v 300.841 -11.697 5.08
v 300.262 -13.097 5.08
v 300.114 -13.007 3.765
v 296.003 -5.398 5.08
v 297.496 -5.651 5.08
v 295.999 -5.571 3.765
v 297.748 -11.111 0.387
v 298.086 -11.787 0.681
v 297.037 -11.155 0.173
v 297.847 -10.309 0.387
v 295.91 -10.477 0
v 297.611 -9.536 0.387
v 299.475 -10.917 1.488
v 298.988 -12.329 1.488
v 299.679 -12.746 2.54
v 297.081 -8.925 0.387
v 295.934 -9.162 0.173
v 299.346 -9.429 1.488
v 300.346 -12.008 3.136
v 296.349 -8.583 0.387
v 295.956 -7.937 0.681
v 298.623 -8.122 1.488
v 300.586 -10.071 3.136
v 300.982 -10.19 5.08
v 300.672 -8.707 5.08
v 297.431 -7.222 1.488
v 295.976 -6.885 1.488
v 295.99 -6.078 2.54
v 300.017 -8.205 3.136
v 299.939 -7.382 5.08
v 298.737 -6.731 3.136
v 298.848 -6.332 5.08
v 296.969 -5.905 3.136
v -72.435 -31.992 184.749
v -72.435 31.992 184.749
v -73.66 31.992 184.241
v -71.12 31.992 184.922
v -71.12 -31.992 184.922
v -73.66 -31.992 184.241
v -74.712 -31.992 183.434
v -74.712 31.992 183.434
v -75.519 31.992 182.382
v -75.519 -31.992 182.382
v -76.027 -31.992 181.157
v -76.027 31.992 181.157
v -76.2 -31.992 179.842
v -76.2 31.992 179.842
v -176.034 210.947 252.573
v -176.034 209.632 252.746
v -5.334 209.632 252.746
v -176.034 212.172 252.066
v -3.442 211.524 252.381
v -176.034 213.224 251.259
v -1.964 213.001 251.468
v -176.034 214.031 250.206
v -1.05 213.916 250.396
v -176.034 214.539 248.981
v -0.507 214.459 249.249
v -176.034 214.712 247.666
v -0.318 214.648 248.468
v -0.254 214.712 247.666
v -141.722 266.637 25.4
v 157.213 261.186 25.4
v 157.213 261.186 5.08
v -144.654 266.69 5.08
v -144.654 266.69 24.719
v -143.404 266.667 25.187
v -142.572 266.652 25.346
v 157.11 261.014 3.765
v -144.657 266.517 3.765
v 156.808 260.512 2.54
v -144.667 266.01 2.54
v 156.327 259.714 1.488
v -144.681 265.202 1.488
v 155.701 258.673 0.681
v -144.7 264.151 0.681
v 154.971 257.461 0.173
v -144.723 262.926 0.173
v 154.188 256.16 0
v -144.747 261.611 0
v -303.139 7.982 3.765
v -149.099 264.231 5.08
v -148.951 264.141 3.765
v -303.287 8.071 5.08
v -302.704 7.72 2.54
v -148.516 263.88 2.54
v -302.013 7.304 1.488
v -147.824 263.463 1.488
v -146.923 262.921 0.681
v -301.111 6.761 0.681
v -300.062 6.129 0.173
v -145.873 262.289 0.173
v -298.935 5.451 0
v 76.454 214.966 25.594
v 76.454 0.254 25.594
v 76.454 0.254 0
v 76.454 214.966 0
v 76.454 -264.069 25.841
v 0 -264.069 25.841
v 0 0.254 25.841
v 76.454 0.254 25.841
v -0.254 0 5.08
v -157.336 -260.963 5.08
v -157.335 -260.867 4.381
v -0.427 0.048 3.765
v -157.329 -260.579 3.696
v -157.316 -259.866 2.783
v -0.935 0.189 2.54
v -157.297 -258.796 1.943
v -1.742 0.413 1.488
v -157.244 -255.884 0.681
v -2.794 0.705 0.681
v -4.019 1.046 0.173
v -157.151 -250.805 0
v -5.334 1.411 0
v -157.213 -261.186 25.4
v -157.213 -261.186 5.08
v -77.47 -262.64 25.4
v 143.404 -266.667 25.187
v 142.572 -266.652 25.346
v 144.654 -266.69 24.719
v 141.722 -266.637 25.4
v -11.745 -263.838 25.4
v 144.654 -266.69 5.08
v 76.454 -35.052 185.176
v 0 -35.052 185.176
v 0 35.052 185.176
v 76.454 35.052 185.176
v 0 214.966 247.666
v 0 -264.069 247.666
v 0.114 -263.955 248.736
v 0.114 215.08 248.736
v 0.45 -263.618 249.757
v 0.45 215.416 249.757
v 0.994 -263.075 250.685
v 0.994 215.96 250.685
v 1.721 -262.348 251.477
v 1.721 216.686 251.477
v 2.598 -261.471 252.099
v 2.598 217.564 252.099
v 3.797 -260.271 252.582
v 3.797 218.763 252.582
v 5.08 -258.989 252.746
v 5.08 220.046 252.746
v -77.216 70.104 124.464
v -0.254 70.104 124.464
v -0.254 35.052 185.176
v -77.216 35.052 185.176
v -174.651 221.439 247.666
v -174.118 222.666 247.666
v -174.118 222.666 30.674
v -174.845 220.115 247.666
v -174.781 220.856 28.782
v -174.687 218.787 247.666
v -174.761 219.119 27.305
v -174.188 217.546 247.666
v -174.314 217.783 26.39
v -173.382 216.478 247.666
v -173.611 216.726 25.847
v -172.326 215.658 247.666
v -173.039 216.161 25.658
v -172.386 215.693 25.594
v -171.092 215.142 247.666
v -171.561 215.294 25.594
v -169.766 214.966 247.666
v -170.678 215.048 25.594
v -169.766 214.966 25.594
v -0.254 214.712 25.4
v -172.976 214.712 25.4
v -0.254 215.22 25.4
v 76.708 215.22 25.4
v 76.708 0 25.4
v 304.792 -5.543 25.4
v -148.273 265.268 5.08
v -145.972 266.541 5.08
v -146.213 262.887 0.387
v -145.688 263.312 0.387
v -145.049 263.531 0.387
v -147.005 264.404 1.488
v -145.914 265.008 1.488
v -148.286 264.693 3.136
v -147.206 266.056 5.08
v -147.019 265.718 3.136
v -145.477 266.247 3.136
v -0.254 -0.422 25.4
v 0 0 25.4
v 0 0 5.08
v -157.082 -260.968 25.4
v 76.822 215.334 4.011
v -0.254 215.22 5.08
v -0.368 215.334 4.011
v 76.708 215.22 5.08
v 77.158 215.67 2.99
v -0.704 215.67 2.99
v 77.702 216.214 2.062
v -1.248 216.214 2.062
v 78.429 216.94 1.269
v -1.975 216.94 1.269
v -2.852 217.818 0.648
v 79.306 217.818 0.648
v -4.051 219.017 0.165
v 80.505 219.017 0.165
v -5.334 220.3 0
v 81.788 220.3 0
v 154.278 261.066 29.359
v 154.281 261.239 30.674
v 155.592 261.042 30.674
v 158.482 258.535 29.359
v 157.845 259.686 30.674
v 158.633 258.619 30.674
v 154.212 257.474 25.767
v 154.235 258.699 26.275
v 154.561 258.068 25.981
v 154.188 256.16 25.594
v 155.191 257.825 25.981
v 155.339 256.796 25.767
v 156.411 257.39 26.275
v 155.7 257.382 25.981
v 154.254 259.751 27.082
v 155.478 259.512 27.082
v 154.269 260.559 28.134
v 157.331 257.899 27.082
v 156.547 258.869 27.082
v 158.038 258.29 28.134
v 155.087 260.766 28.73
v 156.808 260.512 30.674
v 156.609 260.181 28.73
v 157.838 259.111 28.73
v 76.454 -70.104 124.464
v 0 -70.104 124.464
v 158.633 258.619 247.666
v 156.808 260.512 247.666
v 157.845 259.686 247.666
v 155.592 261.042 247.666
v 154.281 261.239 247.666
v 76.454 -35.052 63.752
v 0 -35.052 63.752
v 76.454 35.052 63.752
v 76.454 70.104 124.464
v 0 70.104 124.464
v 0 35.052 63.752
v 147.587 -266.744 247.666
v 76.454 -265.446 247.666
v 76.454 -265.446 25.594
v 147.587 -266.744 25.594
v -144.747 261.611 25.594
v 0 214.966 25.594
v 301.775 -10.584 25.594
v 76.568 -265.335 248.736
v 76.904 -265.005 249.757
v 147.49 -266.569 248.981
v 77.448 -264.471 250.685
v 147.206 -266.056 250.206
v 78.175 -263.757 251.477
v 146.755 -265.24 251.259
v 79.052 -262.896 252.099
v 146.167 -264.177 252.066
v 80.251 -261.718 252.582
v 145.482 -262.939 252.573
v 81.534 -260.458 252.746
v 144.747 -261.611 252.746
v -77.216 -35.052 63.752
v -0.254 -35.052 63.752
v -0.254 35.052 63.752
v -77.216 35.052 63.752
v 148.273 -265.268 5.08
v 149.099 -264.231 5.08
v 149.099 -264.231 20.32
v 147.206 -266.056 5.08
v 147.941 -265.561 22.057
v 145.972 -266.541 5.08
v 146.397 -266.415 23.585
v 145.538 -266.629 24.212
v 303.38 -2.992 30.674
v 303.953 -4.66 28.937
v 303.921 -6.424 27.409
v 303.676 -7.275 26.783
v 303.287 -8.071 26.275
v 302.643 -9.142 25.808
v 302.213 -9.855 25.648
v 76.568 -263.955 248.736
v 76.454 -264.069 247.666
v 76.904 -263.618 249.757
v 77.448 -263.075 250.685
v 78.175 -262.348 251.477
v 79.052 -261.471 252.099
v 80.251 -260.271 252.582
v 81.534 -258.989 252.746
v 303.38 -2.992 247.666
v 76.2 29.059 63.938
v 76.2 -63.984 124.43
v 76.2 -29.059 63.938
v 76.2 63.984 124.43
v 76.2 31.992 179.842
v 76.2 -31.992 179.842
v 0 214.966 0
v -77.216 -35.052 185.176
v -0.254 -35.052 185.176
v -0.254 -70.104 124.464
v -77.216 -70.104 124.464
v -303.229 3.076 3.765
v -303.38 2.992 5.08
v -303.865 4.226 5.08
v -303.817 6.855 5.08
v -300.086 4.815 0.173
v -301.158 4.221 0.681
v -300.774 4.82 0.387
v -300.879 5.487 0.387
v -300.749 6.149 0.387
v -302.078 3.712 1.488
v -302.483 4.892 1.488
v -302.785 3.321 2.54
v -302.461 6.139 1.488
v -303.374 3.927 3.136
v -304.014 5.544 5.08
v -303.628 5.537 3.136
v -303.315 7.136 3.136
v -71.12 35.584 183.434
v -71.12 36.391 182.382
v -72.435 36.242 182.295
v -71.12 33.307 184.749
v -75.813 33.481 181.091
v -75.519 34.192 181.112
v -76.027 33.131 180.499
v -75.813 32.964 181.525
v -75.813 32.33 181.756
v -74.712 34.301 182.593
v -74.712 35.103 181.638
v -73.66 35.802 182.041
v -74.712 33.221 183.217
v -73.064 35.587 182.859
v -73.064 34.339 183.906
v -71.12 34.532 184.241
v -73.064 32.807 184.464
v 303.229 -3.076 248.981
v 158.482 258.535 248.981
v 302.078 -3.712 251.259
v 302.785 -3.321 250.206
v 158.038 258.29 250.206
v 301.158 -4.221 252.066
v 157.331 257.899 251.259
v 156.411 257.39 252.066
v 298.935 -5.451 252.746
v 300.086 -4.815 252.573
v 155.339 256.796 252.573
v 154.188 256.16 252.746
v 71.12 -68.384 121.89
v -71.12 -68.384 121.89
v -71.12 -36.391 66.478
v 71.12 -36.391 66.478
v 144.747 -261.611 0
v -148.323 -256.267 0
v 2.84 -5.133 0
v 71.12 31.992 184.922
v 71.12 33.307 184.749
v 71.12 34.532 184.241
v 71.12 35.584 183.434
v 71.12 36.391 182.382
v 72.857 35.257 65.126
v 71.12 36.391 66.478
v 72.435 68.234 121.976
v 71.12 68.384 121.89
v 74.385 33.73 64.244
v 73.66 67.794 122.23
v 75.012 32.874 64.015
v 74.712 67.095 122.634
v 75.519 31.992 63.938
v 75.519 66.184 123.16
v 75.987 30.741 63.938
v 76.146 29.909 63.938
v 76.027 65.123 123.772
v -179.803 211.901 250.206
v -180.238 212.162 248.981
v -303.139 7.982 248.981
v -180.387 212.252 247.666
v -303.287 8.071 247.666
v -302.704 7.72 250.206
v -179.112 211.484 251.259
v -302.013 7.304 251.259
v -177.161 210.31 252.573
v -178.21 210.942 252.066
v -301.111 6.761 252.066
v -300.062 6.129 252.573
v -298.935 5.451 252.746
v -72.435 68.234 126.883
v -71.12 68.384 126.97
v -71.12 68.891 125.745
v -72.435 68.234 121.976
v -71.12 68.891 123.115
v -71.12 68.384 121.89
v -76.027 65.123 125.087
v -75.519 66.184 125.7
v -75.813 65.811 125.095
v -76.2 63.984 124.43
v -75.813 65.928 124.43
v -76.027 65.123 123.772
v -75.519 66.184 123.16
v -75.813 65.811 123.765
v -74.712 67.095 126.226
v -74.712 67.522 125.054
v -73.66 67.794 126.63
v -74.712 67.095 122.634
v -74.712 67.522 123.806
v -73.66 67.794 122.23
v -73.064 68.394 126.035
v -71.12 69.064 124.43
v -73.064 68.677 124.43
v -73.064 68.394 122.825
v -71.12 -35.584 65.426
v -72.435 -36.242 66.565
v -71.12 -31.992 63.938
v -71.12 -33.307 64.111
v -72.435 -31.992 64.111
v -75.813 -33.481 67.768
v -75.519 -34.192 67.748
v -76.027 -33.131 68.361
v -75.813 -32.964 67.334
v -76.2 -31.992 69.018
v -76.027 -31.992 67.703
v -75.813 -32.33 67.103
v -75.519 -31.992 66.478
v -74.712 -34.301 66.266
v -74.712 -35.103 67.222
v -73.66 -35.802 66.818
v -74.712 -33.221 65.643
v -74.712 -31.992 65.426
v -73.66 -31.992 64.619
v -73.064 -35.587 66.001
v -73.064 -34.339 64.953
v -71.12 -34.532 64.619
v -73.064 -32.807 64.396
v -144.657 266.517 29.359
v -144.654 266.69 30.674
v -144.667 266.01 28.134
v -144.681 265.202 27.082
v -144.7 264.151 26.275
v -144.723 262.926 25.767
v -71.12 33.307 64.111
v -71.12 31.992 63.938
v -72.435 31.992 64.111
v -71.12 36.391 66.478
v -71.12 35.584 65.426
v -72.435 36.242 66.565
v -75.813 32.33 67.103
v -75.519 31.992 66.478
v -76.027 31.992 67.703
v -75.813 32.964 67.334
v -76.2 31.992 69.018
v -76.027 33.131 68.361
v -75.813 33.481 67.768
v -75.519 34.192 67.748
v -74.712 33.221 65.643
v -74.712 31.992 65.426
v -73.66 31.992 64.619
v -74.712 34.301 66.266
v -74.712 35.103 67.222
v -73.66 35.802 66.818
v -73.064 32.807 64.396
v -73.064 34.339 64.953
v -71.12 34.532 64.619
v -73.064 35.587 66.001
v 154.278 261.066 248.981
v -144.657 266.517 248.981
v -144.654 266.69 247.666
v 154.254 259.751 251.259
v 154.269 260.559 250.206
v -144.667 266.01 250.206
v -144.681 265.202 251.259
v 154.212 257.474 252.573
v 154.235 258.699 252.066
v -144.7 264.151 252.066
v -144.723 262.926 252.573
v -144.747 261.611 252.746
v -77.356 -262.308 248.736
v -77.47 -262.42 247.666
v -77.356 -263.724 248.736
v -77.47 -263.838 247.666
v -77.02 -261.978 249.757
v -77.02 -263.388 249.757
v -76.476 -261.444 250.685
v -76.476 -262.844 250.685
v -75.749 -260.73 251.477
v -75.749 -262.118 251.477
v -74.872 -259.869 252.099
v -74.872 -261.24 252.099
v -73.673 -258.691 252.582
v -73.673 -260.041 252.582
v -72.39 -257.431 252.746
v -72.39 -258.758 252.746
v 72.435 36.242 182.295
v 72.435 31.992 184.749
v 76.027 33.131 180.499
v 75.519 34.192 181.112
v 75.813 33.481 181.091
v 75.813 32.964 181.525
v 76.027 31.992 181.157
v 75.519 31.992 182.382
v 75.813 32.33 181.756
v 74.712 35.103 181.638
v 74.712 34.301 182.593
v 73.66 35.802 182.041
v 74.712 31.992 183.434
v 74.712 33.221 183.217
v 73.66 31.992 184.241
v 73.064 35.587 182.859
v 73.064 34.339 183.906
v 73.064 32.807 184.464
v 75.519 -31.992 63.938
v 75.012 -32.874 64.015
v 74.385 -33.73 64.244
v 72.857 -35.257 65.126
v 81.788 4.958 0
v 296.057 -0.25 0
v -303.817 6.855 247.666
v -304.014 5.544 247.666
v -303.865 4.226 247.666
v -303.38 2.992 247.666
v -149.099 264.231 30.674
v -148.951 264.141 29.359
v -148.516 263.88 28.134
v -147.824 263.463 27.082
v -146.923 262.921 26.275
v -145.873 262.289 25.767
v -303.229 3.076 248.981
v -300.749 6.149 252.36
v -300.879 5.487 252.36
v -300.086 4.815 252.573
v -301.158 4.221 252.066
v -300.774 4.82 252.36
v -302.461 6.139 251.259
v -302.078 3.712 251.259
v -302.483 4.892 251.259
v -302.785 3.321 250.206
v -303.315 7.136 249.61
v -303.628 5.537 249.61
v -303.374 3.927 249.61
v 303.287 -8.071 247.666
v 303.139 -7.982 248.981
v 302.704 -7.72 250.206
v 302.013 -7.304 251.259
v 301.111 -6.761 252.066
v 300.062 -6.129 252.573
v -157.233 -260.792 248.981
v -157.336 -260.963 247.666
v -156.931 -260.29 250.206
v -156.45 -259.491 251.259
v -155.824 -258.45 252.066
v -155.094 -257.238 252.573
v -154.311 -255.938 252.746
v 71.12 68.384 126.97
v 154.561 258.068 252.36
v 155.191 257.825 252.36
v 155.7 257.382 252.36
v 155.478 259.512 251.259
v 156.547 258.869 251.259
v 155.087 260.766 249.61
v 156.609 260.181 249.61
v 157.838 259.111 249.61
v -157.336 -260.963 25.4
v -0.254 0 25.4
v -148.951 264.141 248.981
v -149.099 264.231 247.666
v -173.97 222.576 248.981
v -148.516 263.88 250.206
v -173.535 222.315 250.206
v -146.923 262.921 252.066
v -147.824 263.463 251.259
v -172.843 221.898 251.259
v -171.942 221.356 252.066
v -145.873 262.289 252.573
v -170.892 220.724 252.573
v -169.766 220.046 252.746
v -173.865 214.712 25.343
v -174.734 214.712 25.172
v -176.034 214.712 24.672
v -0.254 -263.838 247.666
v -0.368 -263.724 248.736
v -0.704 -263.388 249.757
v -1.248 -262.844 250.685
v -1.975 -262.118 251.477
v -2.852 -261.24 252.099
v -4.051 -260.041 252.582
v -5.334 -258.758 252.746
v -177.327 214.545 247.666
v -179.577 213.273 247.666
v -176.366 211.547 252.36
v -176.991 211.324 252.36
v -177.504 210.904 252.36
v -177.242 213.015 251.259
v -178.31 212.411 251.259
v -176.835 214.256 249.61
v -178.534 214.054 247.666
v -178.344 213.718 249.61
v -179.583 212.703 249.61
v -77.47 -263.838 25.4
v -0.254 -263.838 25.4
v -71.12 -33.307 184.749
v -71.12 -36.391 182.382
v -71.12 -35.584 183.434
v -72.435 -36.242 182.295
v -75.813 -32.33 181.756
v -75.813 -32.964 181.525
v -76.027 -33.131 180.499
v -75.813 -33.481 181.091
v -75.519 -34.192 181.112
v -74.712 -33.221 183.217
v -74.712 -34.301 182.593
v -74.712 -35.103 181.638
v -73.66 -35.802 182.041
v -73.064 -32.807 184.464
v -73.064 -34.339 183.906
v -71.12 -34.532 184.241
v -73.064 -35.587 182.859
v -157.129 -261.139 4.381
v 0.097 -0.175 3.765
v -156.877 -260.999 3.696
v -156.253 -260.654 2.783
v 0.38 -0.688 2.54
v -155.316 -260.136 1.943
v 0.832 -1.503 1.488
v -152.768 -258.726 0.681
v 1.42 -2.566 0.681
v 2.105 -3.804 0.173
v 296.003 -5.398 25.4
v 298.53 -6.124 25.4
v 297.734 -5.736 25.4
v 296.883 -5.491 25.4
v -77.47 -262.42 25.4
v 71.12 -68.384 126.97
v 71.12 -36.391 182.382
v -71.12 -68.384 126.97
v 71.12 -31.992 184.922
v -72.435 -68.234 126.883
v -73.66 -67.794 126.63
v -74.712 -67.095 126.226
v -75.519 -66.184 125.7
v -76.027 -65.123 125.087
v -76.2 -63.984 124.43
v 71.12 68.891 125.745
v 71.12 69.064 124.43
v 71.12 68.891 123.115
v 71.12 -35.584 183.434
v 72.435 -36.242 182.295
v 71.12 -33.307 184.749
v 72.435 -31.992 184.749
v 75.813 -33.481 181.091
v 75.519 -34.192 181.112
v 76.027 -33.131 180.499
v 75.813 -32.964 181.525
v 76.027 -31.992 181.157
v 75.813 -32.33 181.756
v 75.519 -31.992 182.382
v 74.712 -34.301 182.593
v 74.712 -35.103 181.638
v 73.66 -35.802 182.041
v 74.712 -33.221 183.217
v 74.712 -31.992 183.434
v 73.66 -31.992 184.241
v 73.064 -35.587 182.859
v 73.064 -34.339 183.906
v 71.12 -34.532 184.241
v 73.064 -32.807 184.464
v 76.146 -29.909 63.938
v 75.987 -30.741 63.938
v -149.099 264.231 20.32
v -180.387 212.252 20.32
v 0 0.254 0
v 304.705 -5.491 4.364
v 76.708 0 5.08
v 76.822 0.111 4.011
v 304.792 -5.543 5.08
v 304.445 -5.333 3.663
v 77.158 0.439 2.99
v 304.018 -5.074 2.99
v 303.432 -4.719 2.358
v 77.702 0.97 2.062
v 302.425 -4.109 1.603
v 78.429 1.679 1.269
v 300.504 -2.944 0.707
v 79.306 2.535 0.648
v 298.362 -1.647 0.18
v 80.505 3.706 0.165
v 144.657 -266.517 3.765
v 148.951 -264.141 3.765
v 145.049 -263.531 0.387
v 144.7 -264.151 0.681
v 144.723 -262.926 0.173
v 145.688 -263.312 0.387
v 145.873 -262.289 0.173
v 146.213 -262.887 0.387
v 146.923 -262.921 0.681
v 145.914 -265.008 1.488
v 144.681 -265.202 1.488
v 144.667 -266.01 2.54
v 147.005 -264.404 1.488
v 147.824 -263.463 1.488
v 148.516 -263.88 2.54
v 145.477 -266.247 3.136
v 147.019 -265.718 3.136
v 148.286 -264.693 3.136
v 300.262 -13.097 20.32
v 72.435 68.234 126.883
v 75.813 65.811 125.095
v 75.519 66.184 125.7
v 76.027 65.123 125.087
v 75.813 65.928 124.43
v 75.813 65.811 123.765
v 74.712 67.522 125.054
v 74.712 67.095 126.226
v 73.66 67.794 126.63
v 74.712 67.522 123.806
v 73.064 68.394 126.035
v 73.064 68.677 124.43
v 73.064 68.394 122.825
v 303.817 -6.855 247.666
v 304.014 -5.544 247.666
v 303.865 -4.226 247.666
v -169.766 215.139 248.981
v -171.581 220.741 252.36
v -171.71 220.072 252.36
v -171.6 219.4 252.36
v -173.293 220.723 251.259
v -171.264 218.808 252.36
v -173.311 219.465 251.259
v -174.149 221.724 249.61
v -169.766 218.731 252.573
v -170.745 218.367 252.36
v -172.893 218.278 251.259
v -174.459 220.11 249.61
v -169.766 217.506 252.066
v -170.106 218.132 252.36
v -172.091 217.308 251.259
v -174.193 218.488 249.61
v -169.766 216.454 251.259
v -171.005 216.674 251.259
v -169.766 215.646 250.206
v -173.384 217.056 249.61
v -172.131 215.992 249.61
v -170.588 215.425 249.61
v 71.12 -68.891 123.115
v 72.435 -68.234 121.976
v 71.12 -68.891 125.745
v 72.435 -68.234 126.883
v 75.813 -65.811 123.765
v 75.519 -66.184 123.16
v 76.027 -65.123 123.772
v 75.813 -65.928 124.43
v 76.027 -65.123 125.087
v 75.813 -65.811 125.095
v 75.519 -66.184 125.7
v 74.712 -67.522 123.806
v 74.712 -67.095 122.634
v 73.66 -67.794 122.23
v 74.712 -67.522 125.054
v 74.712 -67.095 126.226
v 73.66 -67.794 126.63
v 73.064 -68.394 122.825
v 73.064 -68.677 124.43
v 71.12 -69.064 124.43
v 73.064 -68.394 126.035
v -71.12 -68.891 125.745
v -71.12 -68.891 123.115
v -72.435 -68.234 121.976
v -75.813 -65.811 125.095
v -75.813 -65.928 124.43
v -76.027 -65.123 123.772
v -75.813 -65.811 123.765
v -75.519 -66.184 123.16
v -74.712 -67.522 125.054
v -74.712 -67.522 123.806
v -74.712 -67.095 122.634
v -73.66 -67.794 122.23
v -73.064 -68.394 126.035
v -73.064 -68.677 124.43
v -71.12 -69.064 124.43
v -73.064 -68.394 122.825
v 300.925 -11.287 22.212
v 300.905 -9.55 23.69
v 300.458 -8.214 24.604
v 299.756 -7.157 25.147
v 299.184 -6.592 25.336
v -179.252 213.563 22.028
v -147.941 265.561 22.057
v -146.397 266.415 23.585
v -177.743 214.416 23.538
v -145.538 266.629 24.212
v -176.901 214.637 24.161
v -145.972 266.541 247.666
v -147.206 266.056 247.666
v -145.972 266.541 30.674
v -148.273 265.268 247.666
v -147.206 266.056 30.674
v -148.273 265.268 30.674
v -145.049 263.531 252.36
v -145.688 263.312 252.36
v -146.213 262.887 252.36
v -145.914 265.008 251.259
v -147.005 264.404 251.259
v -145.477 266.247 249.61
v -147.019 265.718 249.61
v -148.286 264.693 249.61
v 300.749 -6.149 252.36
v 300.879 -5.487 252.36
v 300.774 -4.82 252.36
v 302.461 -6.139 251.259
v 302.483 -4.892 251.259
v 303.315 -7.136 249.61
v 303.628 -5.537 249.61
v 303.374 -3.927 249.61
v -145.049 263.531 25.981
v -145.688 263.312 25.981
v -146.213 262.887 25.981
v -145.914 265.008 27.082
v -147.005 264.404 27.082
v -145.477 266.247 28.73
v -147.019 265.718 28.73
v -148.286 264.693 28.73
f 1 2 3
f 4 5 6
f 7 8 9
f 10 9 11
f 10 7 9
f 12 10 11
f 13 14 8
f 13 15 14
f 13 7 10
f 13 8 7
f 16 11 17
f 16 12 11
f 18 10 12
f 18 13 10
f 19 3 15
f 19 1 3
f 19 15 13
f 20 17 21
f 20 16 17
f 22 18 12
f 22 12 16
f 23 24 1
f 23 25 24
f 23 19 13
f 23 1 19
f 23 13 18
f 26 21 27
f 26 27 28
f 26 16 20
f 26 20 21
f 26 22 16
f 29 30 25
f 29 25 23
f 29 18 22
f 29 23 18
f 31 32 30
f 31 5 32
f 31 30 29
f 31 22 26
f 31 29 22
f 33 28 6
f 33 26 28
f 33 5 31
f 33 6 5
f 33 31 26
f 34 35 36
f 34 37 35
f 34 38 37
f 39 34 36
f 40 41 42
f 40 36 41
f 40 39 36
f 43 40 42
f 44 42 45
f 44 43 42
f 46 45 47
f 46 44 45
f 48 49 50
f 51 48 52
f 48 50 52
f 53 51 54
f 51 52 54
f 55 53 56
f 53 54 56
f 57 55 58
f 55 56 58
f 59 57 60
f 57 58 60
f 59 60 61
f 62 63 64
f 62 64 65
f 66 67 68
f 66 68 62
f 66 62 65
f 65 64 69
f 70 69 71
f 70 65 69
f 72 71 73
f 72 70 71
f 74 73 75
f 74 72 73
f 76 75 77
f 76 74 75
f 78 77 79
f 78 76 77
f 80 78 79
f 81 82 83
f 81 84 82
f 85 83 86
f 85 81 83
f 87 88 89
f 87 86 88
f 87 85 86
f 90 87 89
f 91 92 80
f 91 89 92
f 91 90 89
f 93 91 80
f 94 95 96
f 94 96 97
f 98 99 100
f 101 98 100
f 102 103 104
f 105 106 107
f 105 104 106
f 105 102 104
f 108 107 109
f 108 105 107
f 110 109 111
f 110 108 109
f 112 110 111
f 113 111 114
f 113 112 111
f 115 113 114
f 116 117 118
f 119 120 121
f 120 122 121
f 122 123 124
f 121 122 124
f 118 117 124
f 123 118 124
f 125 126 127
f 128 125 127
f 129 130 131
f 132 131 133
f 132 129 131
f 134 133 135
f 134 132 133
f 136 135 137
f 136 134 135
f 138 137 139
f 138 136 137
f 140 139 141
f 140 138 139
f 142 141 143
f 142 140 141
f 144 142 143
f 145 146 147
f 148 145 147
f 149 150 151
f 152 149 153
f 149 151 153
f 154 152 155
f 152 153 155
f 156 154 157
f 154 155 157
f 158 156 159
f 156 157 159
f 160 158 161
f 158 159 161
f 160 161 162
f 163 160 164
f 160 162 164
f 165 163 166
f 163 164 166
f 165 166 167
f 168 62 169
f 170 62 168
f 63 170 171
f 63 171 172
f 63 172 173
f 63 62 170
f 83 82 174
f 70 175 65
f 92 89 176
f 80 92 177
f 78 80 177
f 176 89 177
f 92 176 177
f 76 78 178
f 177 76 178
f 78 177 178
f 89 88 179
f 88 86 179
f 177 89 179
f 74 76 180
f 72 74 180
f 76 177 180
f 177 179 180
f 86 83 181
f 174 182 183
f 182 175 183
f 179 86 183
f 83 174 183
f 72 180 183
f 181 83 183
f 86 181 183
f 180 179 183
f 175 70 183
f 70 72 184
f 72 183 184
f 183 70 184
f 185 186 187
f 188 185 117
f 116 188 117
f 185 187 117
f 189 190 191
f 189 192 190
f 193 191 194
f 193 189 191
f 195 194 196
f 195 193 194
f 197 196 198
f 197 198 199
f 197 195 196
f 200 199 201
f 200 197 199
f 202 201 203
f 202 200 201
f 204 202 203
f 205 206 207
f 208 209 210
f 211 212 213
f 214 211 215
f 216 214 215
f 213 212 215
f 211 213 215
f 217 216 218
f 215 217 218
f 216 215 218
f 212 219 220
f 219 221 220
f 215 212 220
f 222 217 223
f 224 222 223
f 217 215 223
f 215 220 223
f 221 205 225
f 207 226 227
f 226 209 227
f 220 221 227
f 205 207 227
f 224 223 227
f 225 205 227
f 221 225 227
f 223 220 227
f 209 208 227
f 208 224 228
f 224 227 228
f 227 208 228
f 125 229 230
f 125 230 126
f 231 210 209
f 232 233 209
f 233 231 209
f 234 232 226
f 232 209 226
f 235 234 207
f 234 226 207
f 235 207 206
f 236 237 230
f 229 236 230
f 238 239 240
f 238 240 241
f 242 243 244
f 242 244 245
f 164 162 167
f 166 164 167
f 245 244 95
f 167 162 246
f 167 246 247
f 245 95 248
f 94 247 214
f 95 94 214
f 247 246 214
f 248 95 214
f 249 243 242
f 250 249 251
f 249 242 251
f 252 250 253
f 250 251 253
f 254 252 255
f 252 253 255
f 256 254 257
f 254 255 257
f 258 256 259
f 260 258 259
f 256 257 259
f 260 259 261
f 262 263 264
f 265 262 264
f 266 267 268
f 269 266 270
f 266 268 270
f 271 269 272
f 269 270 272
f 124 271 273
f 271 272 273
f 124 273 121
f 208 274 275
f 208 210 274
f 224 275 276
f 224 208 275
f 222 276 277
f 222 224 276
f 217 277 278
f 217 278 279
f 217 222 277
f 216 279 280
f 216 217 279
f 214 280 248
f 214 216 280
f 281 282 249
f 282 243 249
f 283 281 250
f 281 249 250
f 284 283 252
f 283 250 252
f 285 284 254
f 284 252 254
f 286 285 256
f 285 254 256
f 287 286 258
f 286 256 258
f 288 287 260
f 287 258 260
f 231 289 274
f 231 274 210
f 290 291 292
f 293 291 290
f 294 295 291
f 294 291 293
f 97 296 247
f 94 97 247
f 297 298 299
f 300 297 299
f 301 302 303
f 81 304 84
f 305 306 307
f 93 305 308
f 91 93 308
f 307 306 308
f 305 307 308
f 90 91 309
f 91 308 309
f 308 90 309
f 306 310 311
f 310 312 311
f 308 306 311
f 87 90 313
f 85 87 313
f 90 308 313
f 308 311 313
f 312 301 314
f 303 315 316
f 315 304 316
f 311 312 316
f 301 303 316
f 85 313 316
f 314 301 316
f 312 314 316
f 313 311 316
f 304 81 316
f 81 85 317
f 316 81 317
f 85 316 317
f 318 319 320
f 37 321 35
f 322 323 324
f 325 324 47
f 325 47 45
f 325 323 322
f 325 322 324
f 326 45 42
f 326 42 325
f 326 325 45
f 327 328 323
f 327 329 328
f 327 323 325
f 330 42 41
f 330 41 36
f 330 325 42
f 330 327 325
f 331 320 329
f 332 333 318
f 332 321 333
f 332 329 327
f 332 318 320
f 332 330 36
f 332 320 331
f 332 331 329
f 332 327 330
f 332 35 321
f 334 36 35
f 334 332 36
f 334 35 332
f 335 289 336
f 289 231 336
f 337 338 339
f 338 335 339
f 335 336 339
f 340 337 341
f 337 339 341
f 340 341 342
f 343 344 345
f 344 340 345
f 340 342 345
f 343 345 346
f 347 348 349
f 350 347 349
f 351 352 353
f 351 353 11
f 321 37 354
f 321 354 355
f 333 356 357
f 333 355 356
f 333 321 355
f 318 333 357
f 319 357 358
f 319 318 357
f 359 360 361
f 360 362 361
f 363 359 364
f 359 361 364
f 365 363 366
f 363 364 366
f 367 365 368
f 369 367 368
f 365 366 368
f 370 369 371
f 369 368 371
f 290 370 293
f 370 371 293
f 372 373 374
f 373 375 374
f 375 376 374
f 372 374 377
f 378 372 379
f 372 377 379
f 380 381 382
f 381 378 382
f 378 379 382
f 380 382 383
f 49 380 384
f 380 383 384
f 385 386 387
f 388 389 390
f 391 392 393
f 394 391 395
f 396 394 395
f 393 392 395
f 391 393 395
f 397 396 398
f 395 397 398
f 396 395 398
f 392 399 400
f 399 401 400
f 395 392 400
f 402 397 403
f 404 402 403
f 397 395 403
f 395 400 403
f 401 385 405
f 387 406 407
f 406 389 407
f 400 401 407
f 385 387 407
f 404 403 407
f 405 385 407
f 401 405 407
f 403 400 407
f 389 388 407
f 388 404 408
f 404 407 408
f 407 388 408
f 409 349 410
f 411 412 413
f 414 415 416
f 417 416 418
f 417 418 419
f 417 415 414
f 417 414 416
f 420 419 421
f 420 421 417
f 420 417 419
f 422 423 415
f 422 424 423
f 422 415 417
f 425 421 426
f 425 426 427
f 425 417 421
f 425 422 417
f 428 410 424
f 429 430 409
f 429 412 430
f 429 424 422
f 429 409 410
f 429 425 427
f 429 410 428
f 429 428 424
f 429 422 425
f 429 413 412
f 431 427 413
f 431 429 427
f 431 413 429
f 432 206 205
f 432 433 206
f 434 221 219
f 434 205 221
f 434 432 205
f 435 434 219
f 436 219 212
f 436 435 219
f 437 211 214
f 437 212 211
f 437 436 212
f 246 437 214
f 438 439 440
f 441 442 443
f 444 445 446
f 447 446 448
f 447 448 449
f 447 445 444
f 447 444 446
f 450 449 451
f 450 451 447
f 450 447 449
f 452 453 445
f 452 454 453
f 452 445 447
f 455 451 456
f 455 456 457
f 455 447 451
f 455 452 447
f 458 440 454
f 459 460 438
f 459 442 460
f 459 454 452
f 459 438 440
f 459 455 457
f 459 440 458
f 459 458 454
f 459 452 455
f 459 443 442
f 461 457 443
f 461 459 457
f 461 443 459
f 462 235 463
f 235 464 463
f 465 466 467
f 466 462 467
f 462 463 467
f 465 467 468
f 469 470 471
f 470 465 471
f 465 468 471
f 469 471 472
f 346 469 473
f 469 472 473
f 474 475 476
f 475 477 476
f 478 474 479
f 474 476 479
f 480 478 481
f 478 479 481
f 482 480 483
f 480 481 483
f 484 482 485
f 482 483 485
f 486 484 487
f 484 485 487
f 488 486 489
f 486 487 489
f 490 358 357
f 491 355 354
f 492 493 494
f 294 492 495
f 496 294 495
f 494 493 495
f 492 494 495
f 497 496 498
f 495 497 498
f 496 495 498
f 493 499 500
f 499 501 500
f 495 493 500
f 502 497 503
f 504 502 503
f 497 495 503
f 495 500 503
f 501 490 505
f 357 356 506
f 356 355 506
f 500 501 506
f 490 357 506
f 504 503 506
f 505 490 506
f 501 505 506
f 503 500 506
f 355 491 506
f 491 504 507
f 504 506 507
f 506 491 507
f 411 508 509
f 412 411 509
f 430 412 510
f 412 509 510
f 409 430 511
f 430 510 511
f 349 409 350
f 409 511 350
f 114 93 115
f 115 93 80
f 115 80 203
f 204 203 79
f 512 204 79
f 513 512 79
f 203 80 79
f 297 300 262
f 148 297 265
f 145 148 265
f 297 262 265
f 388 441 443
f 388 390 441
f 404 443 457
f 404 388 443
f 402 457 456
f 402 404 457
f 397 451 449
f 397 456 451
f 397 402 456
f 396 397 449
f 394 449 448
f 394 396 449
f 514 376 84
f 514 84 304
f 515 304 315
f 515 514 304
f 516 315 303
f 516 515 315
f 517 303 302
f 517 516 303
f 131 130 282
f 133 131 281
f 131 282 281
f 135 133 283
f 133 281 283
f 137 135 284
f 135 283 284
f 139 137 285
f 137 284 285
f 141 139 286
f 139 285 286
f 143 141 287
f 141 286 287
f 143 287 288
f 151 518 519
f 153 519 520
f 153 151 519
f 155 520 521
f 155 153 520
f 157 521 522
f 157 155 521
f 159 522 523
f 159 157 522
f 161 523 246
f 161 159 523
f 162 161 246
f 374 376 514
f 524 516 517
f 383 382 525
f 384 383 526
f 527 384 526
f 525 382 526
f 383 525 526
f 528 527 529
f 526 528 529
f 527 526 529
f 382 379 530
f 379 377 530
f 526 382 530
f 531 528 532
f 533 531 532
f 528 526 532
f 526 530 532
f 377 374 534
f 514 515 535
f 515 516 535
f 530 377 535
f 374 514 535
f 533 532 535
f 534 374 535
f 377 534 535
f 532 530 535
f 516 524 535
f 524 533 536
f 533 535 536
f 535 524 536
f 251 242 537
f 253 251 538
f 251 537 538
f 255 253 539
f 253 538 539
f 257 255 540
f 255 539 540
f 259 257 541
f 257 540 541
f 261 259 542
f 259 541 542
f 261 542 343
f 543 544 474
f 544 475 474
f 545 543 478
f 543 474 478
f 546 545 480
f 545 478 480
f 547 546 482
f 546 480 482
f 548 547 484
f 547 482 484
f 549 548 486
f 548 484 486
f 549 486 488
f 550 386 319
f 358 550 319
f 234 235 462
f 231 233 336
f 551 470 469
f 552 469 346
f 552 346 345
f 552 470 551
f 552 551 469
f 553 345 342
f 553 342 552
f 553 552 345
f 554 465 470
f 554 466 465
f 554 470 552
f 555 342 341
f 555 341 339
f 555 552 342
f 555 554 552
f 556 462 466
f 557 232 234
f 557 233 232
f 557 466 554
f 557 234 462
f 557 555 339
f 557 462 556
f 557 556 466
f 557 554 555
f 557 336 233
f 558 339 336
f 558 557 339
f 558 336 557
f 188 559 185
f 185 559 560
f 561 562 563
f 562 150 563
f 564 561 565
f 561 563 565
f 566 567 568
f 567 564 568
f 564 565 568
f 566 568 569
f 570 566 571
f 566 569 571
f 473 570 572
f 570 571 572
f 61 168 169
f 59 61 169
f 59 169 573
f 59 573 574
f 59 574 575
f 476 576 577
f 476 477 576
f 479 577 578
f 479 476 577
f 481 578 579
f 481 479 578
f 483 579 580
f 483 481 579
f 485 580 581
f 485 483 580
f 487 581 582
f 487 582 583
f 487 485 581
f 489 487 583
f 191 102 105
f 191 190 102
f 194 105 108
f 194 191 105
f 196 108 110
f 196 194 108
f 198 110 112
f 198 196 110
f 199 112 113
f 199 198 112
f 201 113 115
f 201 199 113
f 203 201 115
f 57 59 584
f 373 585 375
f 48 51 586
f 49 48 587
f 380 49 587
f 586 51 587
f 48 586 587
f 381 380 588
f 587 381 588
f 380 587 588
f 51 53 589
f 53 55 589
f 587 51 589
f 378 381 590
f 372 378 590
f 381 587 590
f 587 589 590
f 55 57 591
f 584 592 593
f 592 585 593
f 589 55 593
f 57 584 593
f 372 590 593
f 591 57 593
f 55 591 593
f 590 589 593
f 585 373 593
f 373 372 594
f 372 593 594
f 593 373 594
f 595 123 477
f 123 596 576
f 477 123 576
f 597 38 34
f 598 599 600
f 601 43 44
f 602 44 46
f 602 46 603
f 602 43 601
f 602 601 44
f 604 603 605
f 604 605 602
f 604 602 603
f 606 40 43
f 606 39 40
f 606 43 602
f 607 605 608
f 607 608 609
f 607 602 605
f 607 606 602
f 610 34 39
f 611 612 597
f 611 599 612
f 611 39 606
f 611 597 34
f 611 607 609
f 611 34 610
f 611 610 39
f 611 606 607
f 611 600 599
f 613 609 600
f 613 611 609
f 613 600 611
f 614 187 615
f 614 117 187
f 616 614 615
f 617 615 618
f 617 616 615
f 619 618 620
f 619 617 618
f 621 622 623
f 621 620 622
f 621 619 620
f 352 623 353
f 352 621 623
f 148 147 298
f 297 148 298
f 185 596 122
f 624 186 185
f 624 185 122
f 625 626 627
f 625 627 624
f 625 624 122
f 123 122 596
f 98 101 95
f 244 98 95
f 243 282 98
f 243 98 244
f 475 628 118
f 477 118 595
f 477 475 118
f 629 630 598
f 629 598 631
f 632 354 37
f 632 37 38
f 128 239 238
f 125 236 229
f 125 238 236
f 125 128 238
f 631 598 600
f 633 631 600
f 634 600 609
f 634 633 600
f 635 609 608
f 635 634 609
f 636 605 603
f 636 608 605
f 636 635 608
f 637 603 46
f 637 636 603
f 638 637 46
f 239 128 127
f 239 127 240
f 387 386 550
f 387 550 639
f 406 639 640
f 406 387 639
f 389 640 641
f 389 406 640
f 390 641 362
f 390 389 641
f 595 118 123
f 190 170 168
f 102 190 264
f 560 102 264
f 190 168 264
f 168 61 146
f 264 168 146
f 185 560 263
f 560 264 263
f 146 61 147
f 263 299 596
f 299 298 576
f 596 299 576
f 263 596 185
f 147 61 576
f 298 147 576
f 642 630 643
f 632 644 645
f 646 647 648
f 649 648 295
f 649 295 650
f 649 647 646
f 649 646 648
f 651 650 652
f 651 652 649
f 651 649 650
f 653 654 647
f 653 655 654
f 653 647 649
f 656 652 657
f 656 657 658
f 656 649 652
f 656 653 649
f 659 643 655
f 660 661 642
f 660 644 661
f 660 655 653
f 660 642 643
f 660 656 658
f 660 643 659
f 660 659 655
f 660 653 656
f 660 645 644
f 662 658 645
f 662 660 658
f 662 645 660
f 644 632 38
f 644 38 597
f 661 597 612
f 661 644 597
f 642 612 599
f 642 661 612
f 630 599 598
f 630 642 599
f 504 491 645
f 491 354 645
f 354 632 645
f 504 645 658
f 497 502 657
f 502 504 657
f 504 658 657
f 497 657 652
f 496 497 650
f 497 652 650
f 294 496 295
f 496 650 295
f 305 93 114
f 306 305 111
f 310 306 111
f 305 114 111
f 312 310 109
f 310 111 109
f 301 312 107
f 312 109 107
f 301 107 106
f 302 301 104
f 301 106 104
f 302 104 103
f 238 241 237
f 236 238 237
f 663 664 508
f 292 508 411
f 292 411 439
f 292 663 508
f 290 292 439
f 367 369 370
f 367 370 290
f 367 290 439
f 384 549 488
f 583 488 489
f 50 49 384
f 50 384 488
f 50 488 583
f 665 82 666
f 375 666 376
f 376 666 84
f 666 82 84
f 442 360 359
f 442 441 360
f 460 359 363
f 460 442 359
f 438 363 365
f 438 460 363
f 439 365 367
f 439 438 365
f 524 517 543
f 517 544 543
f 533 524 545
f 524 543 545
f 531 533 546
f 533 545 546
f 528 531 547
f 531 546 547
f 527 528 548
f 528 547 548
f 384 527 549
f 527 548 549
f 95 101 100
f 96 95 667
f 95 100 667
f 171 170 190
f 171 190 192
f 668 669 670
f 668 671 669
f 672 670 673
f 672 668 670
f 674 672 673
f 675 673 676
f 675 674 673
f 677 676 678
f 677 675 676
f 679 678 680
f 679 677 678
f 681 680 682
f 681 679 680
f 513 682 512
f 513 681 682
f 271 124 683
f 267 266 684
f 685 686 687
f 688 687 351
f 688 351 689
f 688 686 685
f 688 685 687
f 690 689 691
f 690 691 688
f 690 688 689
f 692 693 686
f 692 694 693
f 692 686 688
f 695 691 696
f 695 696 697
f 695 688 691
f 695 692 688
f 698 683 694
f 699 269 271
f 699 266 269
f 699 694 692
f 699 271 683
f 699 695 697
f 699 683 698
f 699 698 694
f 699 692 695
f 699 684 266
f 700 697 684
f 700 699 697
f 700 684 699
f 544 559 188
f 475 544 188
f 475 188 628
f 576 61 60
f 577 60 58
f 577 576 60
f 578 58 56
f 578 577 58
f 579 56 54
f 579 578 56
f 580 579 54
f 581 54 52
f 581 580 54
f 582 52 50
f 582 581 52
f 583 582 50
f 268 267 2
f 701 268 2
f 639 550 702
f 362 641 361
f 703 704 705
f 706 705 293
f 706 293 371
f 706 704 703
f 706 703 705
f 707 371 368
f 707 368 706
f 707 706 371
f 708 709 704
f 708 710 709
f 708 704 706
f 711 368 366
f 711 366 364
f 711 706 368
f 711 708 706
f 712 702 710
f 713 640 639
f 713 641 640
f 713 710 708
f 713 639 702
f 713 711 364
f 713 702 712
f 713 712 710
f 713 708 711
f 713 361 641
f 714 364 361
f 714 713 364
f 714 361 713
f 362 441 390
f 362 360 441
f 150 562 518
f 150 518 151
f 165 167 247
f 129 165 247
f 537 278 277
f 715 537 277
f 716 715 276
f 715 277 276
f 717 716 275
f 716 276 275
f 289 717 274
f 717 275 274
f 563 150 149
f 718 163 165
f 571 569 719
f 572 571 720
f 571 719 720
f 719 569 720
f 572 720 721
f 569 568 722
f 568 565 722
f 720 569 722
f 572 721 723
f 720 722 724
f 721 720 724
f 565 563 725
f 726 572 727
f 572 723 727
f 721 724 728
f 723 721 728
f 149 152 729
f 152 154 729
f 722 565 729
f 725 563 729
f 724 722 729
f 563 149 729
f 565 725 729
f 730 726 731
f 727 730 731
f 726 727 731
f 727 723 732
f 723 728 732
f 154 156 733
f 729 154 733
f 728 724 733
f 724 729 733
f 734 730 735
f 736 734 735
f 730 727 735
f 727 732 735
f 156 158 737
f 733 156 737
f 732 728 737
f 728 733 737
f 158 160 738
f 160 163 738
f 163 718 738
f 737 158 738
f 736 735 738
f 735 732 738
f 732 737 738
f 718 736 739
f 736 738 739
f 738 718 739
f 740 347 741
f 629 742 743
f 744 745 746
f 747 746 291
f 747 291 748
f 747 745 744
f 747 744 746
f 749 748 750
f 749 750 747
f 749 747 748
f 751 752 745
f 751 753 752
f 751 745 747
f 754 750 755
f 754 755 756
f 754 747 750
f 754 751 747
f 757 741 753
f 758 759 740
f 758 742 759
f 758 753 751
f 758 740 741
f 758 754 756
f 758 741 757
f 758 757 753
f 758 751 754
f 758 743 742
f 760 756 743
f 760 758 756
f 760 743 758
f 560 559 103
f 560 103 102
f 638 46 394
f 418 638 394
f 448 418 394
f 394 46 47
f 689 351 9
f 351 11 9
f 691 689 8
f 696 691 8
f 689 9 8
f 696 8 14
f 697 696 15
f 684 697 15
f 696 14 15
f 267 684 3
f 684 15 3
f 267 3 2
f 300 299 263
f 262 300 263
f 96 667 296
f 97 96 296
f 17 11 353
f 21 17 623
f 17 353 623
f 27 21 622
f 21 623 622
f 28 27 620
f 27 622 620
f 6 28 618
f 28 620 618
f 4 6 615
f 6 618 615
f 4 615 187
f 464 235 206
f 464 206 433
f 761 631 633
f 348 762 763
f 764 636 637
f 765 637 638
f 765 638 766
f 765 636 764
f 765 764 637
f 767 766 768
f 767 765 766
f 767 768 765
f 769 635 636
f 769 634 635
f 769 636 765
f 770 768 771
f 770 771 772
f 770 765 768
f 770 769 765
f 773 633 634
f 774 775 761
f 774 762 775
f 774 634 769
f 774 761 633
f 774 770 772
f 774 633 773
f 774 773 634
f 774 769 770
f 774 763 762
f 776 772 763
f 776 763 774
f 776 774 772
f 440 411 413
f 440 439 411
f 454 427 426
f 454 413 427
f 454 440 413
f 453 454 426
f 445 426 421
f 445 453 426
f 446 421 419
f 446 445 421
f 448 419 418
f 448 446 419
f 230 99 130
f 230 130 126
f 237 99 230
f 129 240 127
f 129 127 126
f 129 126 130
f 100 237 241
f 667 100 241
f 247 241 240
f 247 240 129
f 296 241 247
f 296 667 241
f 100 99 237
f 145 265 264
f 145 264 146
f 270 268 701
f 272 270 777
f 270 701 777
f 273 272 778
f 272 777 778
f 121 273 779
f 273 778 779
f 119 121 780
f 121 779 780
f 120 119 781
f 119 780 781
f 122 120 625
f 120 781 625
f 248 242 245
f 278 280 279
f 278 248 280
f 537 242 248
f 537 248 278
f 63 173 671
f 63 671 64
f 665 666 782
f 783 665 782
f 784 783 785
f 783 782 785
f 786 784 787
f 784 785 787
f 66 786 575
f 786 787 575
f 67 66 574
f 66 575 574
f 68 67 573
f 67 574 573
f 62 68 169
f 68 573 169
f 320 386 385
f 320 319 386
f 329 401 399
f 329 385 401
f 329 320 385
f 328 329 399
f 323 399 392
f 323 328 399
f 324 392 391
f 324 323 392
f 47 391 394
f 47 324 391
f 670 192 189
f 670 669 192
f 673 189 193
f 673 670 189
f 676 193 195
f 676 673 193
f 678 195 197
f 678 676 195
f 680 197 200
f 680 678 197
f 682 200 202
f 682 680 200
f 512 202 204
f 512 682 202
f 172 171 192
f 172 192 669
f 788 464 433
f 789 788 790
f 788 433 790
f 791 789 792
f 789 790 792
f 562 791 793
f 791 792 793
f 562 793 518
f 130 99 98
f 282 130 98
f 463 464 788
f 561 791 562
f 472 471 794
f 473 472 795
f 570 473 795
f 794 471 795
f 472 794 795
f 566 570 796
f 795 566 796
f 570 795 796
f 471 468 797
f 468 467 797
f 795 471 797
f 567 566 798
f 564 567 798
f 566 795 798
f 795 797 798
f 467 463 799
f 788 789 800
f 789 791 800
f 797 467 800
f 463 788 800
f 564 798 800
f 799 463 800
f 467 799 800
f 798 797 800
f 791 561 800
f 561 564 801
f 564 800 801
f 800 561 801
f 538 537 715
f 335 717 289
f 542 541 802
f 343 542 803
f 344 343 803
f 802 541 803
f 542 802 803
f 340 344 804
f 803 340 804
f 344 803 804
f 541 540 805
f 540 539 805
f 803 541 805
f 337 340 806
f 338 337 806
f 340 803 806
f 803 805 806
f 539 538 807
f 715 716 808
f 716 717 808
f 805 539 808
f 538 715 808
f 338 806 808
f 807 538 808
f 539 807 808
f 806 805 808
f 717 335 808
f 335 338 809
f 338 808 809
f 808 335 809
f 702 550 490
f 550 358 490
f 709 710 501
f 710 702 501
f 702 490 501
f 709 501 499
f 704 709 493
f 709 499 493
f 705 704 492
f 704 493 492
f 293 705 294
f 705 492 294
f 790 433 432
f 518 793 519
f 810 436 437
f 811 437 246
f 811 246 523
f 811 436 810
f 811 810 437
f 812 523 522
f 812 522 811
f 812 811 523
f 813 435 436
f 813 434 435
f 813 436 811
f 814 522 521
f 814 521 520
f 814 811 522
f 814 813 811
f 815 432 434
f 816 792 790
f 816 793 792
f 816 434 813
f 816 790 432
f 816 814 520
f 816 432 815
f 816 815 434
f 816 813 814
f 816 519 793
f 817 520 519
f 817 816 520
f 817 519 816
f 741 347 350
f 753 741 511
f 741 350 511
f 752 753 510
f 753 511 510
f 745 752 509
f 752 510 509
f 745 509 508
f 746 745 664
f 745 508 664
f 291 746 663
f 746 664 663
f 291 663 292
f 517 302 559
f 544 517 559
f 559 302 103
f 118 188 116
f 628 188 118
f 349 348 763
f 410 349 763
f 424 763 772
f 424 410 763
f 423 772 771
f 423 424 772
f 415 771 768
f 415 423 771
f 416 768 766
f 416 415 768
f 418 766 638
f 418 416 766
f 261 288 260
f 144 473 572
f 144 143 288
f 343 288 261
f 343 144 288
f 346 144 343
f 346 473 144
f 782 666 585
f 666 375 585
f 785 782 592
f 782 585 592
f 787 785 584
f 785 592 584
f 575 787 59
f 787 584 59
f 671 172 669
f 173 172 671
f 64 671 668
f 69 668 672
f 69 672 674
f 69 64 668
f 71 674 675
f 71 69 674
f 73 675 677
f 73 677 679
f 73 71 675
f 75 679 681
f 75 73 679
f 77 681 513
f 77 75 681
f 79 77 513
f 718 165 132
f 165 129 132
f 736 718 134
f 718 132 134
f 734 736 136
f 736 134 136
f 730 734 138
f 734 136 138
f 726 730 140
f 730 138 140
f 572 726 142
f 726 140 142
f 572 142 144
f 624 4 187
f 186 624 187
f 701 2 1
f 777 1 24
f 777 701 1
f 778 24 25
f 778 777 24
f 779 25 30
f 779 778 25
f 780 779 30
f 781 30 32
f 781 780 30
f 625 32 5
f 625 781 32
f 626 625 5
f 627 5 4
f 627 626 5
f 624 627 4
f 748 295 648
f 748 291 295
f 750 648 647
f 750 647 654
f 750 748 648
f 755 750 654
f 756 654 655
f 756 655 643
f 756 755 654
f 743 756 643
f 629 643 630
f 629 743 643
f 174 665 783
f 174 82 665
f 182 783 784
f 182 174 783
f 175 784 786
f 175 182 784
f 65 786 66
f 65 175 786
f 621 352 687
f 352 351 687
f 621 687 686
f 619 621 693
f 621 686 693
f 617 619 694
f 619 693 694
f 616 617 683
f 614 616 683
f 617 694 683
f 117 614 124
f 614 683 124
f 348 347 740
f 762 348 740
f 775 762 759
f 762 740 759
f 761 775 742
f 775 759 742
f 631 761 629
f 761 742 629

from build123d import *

# Parameters (mm, degrees)
F2_DEPTH      = 25.4
F4_DEPTH      = 76.2
F4_DEPTH_BACK = 76.2
F6_DEPTH      = 76.454
F8_DEPTH      = 227.1522
F10_DEPTH     = 25.4
F12_W         = 478.5499326668
F12_H         = 227.3464668878
F13_DEPTH     = 77.216
F15_DEPTH     = 227.3464668878
F16_W         = 76.454
F16_H         = 60.1742118597
F17_DEPTH     = 163.7678072
F18_R         = 5.08
F18_2_R       = 5.08
F20_R         = 5.08


# Not quite as in the source:
# - an extrude ends at something that could not be found from the text; its depth is read off the source's solid


with BuildPart() as f2:
    # F1 (on face) → F2 (new body)
    with BuildSketch(Plane.XY):
        Polygon((304.8, -5.5580618585), (0, 0), (-157.2134227653, -261.1855121443), (147.5865772347, -266.7435740027), align=None)
    extrude(amount=F2_DEPTH)



with BuildPart() as f4:
    # F3 (on Right) → F4 (new body, two sides)
    with BuildSketch(Plane.YZ) as f4_sk:
        Polygon((34.925, 184.9217274444), (-34.925, 184.9217274444), (-69.85, 124.4298529901), (-34.925, 63.9379785357), (34.925, 63.9379785357), (69.85, 124.4298529901), align=None)
    extrude(amount=F4_DEPTH)
    extrude(f4_sk.sketch, amount=-F4_DEPTH_BACK)

    # F20
    f20_edges = [f4.edges().sort_by_distance(p)[0] for p in [
        (76.2, 0, 184.921727),
        (0, -34.925, 184.921727),
        (-76.2, 0, 184.921727),
        (0, 34.925, 184.921727),
        (-76.2, 52.3875, 154.67579),
        (-76.2, -52.3875, 154.67579),
        (-76.2, -52.3875, 94.183916),
        (-76.2, 0, 63.937979),
        (-76.2, 52.3875, 94.183916),
        (76.2, -52.3875, 154.67579),
        (0, -69.85, 124.429853),
        (0, 69.85, 124.429853),
        (76.2, 52.3875, 154.67579),
        (76.2, -52.3875, 94.183916),
        (0, -34.925, 63.937979),
        (0, 34.925, 63.937979),
        (76.2, 52.3875, 94.183916),
    ]]
    fillet(f20_edges, radius=F20_R)


with BuildPart() as f6:
    # F5 (on Right) → F6 (new body)
    with BuildSketch(Plane.YZ):
        Polygon((-264.0685473475, 88.9786597022), (-264.0685473475, 25.8405029335), (0.254, 25.8405029335), (0.254, 0), (214.9657905102, 0), (214.9657905102, 252.7464668878), (-203.8943354878, 252.7464668878), (-203.8943354878, 88.9786597022), align=None)
        Polygon((-35.052, 185.1757274444), (35.052, 185.1757274444), (70.104, 124.4638825375), (35.052, 63.7520376306), (-35.052, 63.7520376306), (-70.104, 124.4638825375), align=None, mode=Mode.SUBTRACT)
    extrude(amount=F6_DEPTH)

    # F7 (on face) → F8 (join)
    with BuildSketch(Plane.XY.offset(252.7464668878)):
        Polygon((-178.7527874094, 214.9657905102), (0, 214.9657905102), (76.454, 214.9657905102), (76.454, -203.8943354878), (76.454, -265.4464635552), (147.5865772347, -266.7435740027), (304.8, -5.5580618585), (157.2134227653, 261.1855121443), (-147.5865772347, 266.7435740027), align=None)
    extrude(amount=-F8_DEPTH)

    # F16 (on face) → F17 (join, through all)
    with BuildSketch(Plane.XY.offset(88.9786597022)):
        with Locations((38.227, -233.9814414177)):
            Rectangle(F16_W, F16_H)
    extrude(amount=F17_DEPTH)

    # F18#2
    f18_2_edges = [f6.edges().sort_by_distance(p)[0] for p in [
        (157.213423, 261.185512, 139.170367),
        (-147.586577, 266.743574, 139.170367),
        (4.813423, 263.964543, 252.746467),
        (4.813423, 263.964543, 25.594267),
        (-178.752787, 214.965791, 139.170367),
        (-163.169682, 240.854682, 252.746467),
        (-163.169682, 240.854682, 25.594267),
        (0, -233.981441, 252.746467),
        (38.227, -264.068547, 252.746467),
        (76.454, -264.757505, 252.746467),
        (112.020289, -266.095019, 252.746467),
        (226.193289, -136.150818, 252.746467),
        (231.006711, 127.813725, 252.746467),
        (-89.376394, 214.965791, 252.746467),
        (0, 5.535728, 252.746467),
        (304.8, -5.558062, 139.170367),
        (231.006711, 127.813725, 25.594267),
    ]]
    fillet(f18_2_edges, radius=F18_2_R)


with BuildPart() as f10:
    # F9 (on face) → F10 (new body, through all)
    with BuildSketch(Plane.XY.offset(25.4)):
        Polygon((-304.8, 5.5580618585), (-157.3363911366, -260.9632627806), (-0.254, 0), (-0.254, 215.2197905102), (76.708, 215.2197905102), (76.708, 0), (304.7919404066, -5.54349519), (157.2134227653, 261.1855121443), (-147.5865772347, 266.7435740027), align=None)
    extrude(amount=-F10_DEPTH)


with BuildPart() as f2_1:
    add(f2.part)

    add(f10.part)  # F13 merges F10
    # F12 (on offset) → F13 (join)
    with BuildSketch(Plane(origin=(-0.254, 0, 0), x_dir=(0, -1, 0), z_dir=(-1, 0, 0))):
        with Locations((24.5631758232, 139.0732334439)):
            Rectangle(F12_W, F12_H)
        Polygon((-70.104, 124.4638825375), (-35.052, 185.1757274444), (35.052, 185.1757274444), (70.104, 124.4638825375), (35.052, 63.7520376306), (-35.052, 63.7520376306), align=None, mode=Mode.SUBTRACT)
    extrude(amount=F13_DEPTH)

    # F14 (on face) → F15 (join, through all)
    with BuildSketch(Plane.XY.offset(25.4)):
        Polygon((-178.9056757111, 214.7117905102), (-304.8, 5.5580618585), (-157.3363911366, -260.9632627806), (-77.216, -262.4242670131), (-77.216, 214.7117905102), align=None)
    extrude(amount=F15_DEPTH)

    # F18
    f18_edges = [f2_1.edges().sort_by_distance(p)[0] for p in [
        (-89.579838, 214.711791, 252.746467),
        (-241.852838, 110.134926, 252.746467),
        (-231.068196, -127.7026, 252.746467),
        (-117.403196, -261.691449, 252.746467),
        (-77.47, -263.128889, 252.746467),
        (-38.862, -263.838142, 252.746467),
        (-0.254, -24.563176, 252.746467),
        (-147.586577, 266.743574, 12.7),
        (-226.193289, 136.150818, 0),
        (-304.8, 5.558062, 126.373233),
        (-178.905676, 214.711791, 139.073233),
        (-163.246126, 240.727682, 25.4),
        (-231.068196, -127.7026, 0),
        (-78.795196, -130.481631, 0),
        (-0.254, 107.609895, 0),
        (38.227, 215.219791, 0),
        (76.708, 107.609895, 0),
        (190.74997, -2.771748, 0),
        (231.002682, 127.821008, 0),
        (4.813423, 263.964543, 0),
        (-4.813423, -263.964543, 0),
        (226.193289, -136.150818, 0),
        (152.4, -2.779031, 0),
        (-78.606711, -130.592756, 0),
        (147.586577, -266.743574, 12.7),
        (304.8, -5.558062, 12.7),
        (226.193289, -136.150818, 25.4),
    ]]
    fillet(f18_edges, radius=F18_R)


solid = Compound([f4.part, f6.part, f2_1.part])
